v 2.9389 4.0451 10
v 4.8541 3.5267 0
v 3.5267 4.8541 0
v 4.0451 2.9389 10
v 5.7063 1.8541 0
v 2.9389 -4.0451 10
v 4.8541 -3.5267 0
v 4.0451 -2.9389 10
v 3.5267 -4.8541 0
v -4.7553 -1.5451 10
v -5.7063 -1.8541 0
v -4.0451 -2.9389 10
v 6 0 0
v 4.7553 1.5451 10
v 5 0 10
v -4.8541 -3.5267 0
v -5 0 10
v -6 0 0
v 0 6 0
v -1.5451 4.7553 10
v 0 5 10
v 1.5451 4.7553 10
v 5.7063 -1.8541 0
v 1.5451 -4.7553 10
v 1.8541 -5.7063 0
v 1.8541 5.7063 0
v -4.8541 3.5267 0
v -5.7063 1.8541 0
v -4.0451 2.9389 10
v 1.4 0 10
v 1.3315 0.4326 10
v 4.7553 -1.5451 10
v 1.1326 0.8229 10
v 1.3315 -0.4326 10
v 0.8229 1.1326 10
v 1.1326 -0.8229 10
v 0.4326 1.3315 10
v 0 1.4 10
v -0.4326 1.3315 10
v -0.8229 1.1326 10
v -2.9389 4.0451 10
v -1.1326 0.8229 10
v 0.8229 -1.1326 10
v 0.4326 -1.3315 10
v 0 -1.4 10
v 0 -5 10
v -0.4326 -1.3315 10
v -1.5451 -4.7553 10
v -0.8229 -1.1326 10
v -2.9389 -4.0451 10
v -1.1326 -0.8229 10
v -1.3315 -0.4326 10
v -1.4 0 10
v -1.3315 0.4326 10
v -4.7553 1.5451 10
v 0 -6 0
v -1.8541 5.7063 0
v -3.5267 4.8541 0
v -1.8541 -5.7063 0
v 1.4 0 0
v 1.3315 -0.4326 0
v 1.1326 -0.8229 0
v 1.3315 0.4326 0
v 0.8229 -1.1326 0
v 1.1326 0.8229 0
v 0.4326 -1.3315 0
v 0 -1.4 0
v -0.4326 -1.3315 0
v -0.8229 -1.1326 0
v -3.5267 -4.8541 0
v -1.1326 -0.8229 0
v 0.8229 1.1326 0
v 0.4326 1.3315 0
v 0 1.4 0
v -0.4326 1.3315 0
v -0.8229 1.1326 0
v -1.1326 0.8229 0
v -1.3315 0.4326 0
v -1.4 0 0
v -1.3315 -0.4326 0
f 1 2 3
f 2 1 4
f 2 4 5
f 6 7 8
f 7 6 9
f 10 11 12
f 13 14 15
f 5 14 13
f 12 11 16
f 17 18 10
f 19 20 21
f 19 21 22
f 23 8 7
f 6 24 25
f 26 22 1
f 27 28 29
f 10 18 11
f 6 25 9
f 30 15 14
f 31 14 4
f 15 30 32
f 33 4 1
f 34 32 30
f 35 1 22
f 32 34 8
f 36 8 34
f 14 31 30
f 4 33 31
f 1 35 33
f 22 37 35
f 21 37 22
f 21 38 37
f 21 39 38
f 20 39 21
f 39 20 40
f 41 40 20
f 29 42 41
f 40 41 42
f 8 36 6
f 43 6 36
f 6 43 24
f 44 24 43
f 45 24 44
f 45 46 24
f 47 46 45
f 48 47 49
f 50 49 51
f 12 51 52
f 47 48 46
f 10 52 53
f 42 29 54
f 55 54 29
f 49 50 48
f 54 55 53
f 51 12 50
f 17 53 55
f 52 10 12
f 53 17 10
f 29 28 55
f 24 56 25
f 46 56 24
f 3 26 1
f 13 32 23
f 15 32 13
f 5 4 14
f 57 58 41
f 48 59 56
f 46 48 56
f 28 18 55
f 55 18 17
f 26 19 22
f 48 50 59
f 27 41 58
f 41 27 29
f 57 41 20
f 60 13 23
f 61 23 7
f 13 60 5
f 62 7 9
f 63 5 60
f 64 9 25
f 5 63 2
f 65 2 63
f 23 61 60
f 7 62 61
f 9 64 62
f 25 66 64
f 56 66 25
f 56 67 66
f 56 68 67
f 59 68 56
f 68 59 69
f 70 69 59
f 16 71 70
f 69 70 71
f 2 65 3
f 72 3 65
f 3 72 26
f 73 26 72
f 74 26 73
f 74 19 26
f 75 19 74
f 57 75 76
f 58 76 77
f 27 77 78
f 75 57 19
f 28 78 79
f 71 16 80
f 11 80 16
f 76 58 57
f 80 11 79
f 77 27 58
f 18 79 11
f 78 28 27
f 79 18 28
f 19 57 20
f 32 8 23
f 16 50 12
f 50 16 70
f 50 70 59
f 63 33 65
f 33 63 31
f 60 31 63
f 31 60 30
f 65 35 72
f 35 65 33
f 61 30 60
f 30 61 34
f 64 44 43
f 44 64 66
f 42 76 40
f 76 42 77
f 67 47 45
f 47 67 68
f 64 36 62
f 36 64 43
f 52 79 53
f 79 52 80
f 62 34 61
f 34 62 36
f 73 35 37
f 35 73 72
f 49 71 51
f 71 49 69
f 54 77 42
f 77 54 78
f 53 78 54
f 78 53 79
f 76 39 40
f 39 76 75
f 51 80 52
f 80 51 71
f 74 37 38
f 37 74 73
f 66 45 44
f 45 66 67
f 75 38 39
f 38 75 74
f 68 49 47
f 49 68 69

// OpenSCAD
/*
 * Created by:
 * Thomas Buck <xythobuz@xythobuz.de> in May 2016
 *
 * Licensed under the Creative Commons - Attribution license.
 */

// -----------------------------------------------------------

diameter_outer_min = 10;
diameter_outer_max = 12;
height = 10;
diameter_inner_min = 2.8;
diameter_inner_max = 2.8;

$fn = 20;

// -----------------------------------------------------------

difference() {
    cylinder(d1 = diameter_outer_max, d2 = diameter_outer_min, h = height);
    cylinder(d = diameter_inner_max, d2 = diameter_inner_min, h = height);
}
